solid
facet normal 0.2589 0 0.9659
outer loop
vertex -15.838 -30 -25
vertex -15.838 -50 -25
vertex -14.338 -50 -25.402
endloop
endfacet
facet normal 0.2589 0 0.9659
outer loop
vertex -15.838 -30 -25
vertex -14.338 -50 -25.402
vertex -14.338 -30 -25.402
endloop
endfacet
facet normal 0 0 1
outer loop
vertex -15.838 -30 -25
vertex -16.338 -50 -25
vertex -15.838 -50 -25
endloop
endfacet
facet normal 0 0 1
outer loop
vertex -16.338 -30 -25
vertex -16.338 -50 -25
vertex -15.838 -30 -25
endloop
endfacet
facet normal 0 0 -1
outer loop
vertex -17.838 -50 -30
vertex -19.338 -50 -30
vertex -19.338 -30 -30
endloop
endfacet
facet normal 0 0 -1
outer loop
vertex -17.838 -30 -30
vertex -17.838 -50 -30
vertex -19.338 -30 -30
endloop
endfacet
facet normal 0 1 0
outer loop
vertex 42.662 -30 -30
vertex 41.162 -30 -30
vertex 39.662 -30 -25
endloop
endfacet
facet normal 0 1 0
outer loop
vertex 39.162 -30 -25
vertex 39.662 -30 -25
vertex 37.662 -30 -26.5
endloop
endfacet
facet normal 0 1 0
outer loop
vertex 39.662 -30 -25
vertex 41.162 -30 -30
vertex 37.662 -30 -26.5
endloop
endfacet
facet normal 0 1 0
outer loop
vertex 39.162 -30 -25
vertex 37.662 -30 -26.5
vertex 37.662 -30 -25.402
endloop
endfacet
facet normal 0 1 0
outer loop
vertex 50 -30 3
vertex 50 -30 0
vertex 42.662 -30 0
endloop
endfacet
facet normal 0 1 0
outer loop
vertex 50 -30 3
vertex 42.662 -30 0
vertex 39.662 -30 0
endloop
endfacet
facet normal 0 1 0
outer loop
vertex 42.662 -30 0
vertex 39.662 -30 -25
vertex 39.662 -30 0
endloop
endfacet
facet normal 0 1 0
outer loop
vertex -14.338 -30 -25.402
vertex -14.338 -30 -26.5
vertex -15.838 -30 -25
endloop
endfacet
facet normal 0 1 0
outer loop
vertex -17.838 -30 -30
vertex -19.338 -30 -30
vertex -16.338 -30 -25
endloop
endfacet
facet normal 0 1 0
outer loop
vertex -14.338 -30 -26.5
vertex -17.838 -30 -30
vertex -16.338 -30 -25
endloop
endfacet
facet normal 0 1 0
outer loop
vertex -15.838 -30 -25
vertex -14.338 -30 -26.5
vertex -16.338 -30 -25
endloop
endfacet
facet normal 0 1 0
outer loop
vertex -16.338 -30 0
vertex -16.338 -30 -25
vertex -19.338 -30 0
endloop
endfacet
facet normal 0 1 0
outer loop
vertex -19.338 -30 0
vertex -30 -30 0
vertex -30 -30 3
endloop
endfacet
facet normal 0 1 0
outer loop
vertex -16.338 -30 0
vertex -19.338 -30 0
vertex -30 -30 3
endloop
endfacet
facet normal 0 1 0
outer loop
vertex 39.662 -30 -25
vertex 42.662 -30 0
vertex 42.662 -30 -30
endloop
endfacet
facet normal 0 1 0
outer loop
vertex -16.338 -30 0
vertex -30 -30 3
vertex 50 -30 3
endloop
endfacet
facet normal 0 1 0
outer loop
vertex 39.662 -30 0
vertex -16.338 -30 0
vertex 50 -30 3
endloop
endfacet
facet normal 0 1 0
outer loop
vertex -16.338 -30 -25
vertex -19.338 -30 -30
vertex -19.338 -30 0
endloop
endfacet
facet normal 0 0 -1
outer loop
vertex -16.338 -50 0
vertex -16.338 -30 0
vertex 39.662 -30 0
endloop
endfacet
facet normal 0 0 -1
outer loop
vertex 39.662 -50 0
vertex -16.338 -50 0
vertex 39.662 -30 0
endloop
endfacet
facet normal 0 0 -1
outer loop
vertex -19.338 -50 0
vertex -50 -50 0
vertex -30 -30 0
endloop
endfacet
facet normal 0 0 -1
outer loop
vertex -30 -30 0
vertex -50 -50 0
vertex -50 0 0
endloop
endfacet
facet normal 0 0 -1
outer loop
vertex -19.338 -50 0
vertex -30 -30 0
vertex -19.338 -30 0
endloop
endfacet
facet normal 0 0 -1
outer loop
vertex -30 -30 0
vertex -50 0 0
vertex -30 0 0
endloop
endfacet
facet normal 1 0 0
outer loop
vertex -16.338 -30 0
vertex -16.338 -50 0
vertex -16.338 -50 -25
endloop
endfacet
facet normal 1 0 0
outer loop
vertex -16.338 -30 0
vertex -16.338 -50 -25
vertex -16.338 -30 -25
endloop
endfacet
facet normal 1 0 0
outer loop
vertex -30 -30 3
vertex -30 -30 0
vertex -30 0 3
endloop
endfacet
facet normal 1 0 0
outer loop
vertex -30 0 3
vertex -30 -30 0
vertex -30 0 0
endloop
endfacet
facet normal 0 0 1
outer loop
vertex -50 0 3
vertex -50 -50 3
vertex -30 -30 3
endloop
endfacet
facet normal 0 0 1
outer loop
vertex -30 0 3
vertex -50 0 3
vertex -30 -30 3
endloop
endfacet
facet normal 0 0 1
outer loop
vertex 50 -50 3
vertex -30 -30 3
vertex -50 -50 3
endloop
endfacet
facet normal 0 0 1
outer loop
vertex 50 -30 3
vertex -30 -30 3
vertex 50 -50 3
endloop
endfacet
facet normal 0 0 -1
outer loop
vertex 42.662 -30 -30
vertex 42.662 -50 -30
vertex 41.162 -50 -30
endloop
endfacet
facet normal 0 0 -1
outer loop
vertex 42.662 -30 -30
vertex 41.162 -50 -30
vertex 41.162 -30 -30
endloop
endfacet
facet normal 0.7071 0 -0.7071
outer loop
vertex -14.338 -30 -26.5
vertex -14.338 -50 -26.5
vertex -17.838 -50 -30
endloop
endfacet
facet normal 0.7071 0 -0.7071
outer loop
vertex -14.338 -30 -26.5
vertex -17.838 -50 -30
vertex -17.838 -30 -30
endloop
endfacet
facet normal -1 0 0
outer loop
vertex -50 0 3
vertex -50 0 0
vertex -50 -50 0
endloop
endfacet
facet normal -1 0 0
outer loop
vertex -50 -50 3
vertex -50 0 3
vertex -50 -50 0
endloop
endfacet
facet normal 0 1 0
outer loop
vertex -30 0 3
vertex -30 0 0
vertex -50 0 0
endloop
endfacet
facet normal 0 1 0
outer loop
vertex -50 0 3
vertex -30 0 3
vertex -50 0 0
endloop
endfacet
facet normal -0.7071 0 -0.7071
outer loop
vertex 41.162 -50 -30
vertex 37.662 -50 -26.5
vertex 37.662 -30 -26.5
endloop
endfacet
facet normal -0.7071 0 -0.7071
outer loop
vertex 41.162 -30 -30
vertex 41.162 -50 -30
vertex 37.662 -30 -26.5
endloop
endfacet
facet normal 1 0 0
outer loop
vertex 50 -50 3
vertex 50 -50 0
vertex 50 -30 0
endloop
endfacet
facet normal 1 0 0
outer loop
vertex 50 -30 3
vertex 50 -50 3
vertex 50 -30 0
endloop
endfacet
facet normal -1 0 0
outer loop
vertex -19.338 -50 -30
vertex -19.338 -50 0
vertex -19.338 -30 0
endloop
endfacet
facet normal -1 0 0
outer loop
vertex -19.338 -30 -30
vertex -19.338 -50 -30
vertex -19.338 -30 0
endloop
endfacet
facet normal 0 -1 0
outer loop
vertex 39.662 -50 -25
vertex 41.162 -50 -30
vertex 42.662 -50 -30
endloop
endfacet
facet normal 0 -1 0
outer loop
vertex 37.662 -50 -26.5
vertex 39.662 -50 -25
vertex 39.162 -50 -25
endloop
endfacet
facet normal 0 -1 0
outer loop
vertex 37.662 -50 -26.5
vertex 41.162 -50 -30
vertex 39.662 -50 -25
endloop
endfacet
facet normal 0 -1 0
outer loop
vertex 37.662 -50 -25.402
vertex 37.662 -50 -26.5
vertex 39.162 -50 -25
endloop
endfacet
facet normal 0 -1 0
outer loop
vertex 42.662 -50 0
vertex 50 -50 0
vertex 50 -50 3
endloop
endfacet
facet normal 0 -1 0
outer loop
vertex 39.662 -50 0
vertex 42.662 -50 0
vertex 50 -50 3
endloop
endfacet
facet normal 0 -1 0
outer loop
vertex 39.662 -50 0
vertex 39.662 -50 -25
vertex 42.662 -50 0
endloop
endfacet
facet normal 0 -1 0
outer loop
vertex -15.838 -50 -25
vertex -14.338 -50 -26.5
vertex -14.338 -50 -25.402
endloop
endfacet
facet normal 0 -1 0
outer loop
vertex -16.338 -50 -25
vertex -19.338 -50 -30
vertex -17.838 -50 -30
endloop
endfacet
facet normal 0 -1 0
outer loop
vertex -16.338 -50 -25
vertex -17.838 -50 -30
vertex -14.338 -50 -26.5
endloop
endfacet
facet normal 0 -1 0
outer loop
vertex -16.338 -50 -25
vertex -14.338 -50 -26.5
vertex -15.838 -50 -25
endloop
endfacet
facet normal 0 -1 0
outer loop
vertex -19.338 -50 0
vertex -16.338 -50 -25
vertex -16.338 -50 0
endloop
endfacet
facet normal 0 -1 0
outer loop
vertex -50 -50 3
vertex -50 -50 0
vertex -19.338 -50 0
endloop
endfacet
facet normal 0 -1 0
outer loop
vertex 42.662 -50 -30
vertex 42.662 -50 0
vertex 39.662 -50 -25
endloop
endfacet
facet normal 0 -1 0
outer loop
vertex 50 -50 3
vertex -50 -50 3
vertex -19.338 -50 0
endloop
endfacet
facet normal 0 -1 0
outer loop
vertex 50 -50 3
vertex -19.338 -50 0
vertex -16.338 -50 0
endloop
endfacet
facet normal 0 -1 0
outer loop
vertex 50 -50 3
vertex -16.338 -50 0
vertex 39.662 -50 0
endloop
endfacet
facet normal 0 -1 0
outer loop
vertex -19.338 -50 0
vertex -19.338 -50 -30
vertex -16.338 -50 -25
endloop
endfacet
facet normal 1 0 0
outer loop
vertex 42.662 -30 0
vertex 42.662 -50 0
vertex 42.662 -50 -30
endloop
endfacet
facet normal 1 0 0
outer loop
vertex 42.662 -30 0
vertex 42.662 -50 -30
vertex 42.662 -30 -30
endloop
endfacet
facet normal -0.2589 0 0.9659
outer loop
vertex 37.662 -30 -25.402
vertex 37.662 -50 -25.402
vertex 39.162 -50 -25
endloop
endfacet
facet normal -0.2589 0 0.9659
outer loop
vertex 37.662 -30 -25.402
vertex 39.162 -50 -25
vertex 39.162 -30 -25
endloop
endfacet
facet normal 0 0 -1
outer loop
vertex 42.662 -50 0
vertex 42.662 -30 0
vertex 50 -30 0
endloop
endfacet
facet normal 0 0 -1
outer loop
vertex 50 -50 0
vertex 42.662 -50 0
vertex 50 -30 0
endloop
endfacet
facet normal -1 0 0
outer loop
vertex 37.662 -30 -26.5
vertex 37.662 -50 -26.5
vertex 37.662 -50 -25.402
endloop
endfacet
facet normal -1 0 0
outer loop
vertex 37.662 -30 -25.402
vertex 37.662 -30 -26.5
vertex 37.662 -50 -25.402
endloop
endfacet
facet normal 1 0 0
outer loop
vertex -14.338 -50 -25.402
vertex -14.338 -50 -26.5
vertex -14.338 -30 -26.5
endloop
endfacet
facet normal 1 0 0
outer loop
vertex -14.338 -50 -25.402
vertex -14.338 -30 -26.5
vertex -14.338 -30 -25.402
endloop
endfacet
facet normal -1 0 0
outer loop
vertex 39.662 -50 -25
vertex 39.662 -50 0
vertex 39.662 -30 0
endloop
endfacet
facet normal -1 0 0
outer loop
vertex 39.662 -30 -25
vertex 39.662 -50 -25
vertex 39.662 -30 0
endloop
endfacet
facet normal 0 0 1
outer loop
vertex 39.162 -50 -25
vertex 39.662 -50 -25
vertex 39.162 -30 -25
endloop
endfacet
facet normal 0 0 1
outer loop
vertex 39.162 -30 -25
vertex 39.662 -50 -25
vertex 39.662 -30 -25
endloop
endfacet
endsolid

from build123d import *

# Parameters (mm, degrees)
BOSS_EXTRU_1_DEPTH            = 3
ESQUISSE2_W                   = 3
ESQUISSE2_H                   = 20
BOSS_EXTRU_2_DEPTH            = 30
ESQUISSE3_W                   = 5
ESQUISSE3_H                   = 20
BOSS_EXTRU_3_DEPTH            = 2
CHANFREIN1_SIZE               = 3.5
CHANFREIN2_SIZE               = 1.5
CHANFREIN2_SIZE2              = 0.401923789
CHANFREIN1_OF_SYM_TRIE1_SIZE  = 3.5
CHANFREIN2_OF_SYM_TRIE1_SIZE2 = 1.5
CHANFREIN2_OF_SYM_TRIE1_SIZE  = 0.401923789


with BuildPart() as part:
    # Esquisse1 → Boss.-Extru.1 (new body)
    with BuildSketch(Plane.XY):
        Polygon((-50, 0), (-50, -50), (50, -50), (50, -30), (-30, -30), (-30, 0), align=None)
    extrude(amount=BOSS_EXTRU_1_DEPTH)

    # Esquisse2 → Boss.-Extru.2 (add)
    with BuildSketch(Plane(origin=(0, 0, 0), x_dir=(-1, 0, 0), z_dir=(0, 0, -1))):
        with Locations((-41.161947113, -40)):
            Rectangle(ESQUISSE2_W, ESQUISSE2_H)
    boss_extru_2 = extrude(amount=BOSS_EXTRU_2_DEPTH)

    # Esquisse3 → Boss.-Extru.3 (add)
    with BuildSketch(Plane.ZY.offset(-39.661947113)):
        with Locations((-27.5, -40)):
            Rectangle(ESQUISSE3_W, ESQUISSE3_H)
    boss_extru_3 = extrude(amount=BOSS_EXTRU_3_DEPTH)

    # Chanfrein1
    chanfrein1_edges = [part.edges().sort_by_distance(p)[0] for p in [
        (37.661947113, -40, -30),
    ]]
    chamfer(chanfrein1_edges, length=CHANFREIN1_SIZE)

    # Chanfrein2
    chanfrein2_edges = [part.edges().sort_by_distance(p)[0] for p in [
        (37.661947113, -40, -25),
    ]]
    chanfrein2_side = [part.faces().sort_by_distance(p)[0] for p in [
        (38.661947113, -40, -25),
    ]]
    chamfer(chanfrein2_edges, length=CHANFREIN2_SIZE, length2=CHANFREIN2_SIZE2, reference=chanfrein2_side[0])

    # Symétrie1: Boss.-Extru.2, Boss.-Extru.3 across plane
    add(boss_extru_2.mirror(Plane.ZY.offset(-11.661947113)))
    add(boss_extru_3.mirror(Plane.ZY.offset(-11.661947113)))

    # Chanfrein1 of Symétrie1
    chanfrein1_of_sym_trie1_edges = [part.edges().sort_by_distance(p)[0] for p in [
        (-14.338052887, -40, -30),
    ]]
    chamfer(chanfrein1_of_sym_trie1_edges, length=CHANFREIN1_OF_SYM_TRIE1_SIZE)

    # Chanfrein2 of Symétrie1
    chanfrein2_of_sym_trie1_edges = [part.edges().sort_by_distance(p)[0] for p in [
        (-14.338052887, -40, -25),
    ]]
    chamfer(chanfrein2_of_sym_trie1_edges, length=CHANFREIN2_OF_SYM_TRIE1_SIZE, length2=CHANFREIN2_OF_SYM_TRIE1_SIZE2)


solid = part.part
